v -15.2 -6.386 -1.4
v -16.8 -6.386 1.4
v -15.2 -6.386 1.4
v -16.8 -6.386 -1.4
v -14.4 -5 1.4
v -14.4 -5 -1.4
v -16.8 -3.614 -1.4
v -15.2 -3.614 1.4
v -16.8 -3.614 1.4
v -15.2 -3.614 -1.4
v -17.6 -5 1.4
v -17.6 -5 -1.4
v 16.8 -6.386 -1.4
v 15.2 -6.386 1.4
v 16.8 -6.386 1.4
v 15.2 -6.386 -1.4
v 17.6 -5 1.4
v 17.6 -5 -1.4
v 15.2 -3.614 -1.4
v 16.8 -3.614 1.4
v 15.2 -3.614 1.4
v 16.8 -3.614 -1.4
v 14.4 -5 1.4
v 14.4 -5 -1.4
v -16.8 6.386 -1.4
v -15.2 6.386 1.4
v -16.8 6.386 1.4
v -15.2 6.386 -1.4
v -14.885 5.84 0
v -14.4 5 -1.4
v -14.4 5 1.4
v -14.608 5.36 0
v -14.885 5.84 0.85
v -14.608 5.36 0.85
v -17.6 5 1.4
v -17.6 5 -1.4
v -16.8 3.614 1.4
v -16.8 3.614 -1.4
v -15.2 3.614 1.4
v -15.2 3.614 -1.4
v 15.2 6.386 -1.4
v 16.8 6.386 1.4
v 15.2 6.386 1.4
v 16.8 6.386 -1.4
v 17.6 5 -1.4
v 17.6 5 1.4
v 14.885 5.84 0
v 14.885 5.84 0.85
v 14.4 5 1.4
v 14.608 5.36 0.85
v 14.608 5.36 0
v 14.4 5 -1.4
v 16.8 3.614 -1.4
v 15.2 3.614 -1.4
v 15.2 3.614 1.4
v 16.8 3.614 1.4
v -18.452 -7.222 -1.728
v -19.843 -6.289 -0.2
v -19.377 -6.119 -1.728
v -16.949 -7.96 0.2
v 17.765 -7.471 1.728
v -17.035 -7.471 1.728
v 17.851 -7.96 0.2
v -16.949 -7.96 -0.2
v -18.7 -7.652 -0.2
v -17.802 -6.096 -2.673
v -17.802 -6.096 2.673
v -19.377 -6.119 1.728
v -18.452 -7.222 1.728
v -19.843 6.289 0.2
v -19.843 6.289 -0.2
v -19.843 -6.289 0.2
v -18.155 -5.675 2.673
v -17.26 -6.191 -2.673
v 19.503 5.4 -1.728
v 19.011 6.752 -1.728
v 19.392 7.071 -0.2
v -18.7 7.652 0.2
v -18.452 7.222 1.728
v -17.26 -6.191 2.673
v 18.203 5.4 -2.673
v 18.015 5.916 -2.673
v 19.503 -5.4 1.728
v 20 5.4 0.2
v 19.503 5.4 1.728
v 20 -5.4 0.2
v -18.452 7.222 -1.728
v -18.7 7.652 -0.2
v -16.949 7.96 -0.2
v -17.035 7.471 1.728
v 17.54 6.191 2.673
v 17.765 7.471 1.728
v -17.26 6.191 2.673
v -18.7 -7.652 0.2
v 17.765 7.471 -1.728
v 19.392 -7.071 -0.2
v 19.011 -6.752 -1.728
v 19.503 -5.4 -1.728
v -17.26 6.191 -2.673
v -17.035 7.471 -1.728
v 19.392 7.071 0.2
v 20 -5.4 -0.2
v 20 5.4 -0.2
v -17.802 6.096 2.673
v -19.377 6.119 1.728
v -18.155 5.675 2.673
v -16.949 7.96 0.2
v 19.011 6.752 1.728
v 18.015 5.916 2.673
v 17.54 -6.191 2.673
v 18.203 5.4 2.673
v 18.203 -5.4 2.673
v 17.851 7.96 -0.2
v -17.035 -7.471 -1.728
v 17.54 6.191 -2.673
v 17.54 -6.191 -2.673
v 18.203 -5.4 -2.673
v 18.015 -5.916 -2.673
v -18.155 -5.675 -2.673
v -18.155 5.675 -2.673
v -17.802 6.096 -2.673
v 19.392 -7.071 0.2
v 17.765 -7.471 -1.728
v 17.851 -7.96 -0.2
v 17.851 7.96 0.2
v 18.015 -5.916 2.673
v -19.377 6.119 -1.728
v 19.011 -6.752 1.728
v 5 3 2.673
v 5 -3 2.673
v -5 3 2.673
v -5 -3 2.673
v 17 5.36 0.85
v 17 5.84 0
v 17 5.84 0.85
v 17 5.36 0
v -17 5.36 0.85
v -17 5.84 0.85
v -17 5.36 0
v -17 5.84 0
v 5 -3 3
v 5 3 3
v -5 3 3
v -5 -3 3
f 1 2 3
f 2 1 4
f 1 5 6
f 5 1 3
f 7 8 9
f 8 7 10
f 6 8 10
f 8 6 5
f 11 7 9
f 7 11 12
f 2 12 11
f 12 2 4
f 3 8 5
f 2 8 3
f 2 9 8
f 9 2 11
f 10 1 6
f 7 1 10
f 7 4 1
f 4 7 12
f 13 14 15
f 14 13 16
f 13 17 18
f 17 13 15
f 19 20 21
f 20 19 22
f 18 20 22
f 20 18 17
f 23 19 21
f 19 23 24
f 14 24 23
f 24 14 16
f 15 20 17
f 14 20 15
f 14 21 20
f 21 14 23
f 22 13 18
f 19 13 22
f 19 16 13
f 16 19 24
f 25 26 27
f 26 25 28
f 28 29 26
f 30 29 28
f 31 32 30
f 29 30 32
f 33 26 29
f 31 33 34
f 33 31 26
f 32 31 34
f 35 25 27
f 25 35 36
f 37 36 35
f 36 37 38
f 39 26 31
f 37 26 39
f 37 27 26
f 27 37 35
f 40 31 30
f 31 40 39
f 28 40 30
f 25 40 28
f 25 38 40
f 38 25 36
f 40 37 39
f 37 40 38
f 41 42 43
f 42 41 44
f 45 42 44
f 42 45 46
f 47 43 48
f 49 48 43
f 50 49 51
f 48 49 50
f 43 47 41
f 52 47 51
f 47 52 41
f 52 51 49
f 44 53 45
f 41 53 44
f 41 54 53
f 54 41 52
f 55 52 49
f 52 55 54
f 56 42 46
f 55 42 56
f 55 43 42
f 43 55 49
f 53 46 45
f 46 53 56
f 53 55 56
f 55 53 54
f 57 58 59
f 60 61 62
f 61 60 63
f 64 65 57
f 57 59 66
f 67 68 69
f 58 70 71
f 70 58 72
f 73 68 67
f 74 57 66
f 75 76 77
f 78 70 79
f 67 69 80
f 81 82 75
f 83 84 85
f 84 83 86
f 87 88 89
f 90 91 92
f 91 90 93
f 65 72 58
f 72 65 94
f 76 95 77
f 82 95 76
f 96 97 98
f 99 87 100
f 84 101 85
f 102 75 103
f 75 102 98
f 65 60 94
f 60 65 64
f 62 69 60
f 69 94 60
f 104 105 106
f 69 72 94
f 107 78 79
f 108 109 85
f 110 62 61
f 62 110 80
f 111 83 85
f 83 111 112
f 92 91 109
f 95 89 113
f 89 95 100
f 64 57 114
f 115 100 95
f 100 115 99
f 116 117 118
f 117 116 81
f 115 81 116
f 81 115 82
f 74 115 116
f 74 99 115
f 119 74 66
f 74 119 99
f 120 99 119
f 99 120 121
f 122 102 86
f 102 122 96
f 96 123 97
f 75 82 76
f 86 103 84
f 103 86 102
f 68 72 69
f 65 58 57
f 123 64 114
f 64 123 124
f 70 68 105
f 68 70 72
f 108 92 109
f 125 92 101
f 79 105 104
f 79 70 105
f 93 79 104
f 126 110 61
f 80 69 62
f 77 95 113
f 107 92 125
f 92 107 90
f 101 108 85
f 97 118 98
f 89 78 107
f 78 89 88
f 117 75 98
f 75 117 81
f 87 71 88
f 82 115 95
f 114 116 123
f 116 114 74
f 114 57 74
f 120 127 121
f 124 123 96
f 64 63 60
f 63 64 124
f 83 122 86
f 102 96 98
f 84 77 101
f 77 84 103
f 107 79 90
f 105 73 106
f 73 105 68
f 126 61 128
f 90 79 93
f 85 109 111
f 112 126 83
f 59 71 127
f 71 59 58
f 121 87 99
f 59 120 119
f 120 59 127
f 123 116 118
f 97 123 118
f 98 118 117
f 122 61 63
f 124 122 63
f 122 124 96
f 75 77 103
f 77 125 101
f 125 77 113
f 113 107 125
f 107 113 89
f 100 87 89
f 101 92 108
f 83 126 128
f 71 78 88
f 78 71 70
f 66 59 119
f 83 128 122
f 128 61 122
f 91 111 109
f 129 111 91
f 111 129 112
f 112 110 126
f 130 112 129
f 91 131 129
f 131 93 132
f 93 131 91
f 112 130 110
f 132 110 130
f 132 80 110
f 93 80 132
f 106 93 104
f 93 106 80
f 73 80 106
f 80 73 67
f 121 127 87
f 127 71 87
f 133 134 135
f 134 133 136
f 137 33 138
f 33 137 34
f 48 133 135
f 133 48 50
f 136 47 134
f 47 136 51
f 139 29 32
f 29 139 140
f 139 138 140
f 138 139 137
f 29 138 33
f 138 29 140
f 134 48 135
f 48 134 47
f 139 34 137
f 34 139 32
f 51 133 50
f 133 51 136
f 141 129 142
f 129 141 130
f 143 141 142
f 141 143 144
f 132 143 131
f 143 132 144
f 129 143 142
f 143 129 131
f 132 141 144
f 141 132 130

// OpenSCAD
// Parameters
pcb_length = 40.0; //[20.0:80.0:0.5]
pcb_width = 16.0; //[8.0:32.0:0.5]
pcb_thickness = 1.6; //[0.8:3.2:0.1]
corner_radius = 2.0; //[1.0:4.0:0.25]
edge_chamfer = 0.6; //[0.2:1.2:0.1]
hole_diameter = 3.2; //[2.0:4.0:0.1]
hole_edge_offset_x = 4.0; //[2.0:8.0:0.5]
hole_edge_offset_y = 3.0; //[2.0:6.0:0.5]
hole_cut_extra = 0.6; //[0.2:2.0:0.1]
copper_thickness = 0.05; //[0.02:0.2:0.01]
silkscreen_thickness = 0.05; //[0.02:0.2:0.01]
pad_diameter = 1.8; //[1.0:3.0:0.1]
trace_width = 0.8; //[0.3:2.0:0.1]
component_body_height = 3.0; //[1.5:8.0:0.5]
component_body_size_x = 10.0; //[5.0:20.0:0.5]
component_body_size_y = 6.0; //[3.0:12.0:0.5]
overlap = 0.8; //[0.5:2.0:0.1]

// Base shapes
module pcb_core_box() {
  cube([pcb_length - 2*(corner_radius + edge_chamfer), pcb_width - 2*(corner_radius + edge_chamfer), pcb_thickness - 2*edge_chamfer], center=true);
}

module pcb_rounding_sphere() {
  sphere(r=corner_radius + edge_chamfer);
}

module hole_cutter_cyl() {
  cylinder(h=pcb_thickness + 2*hole_cut_extra, r=hole_diameter/2, center=true);
}

module copper_pad_cyl() {
  cylinder(h=copper_thickness + overlap, r=pad_diameter/2, center=true);
}

module copper_trace_box() {
  cube([pcb_length*0.55, trace_width, copper_thickness + overlap], center=true);
}

module silkscreen_line_box() {
  cube([pcb_length*0.85, trace_width*0.6, silkscreen_thickness + overlap], center=true);
}

module component_body_box() {
  cube([component_body_size_x, component_body_size_y, component_body_height], center=true);
}

// PCB body with rounded corners and edge chamfer
module pcb_body() {
  minkowski() {
    pcb_core_box();
    pcb_rounding_sphere();
  }
}

// Mounting holes
module mounting_holes() {
  union() {
    translate([-pcb_length/2 + hole_edge_offset_x, -pcb_width/2 + hole_edge_offset_y, 0]) hole_cutter_cyl();
    translate([pcb_length/2 - hole_edge_offset_x, -pcb_width/2 + hole_edge_offset_y, 0]) hole_cutter_cyl();
    translate([-pcb_length/2 + hole_edge_offset_x, pcb_width/2 - hole_edge_offset_y, 0]) hole_cutter_cyl();
    translate([pcb_length/2 - hole_edge_offset_x, pcb_width/2 - hole_edge_offset_y, 0]) hole_cutter_cyl();
  }
}

// PCB with holes
module pcb_with_holes() {
  difference() {
    pcb_body();
    mounting_holes();
  }
}

// Copper pads and traces
module copper_pads_traces() {
  union() {
    translate([-pcb_length*0.2, -pcb_width*0.15, pcb_thickness/2 + (copper_thickness + overlap)/2 - overlap]) copper_pad_cyl();
    translate([pcb_length*0.2, -pcb_width*0.15, pcb_thickness/2 + (copper_thickness + overlap)/2 - overlap]) copper_pad_cyl();
    translate([0, pcb_width*0.2, pcb_thickness/2 + (copper_thickness + overlap)/2 - overlap]) copper_pad_cyl();
    translate([0, -pcb_width*0.15, pcb_thickness/2 + (copper_thickness + overlap)/2 - overlap]) copper_trace_box();
  }
}

// Silkscreen markings
module silkscreen_markings() {
  translate([0, pcb_width*0.35, pcb_thickness/2 + (silkscreen_thickness + overlap)/2 - overlap]) silkscreen_line_box();
}

// Placeholder components
module components() {
  translate([0, 0, pcb_thickness/2 + component_body_height/2 - overlap]) component_body_box();
}

// Complete PCB
module pcb_complete_union() {
  union() {
    pcb_with_holes();
    copper_pads_traces();
    silkscreen_markings();
    components();
  }
}

// Final output
pcb_complete_union();
